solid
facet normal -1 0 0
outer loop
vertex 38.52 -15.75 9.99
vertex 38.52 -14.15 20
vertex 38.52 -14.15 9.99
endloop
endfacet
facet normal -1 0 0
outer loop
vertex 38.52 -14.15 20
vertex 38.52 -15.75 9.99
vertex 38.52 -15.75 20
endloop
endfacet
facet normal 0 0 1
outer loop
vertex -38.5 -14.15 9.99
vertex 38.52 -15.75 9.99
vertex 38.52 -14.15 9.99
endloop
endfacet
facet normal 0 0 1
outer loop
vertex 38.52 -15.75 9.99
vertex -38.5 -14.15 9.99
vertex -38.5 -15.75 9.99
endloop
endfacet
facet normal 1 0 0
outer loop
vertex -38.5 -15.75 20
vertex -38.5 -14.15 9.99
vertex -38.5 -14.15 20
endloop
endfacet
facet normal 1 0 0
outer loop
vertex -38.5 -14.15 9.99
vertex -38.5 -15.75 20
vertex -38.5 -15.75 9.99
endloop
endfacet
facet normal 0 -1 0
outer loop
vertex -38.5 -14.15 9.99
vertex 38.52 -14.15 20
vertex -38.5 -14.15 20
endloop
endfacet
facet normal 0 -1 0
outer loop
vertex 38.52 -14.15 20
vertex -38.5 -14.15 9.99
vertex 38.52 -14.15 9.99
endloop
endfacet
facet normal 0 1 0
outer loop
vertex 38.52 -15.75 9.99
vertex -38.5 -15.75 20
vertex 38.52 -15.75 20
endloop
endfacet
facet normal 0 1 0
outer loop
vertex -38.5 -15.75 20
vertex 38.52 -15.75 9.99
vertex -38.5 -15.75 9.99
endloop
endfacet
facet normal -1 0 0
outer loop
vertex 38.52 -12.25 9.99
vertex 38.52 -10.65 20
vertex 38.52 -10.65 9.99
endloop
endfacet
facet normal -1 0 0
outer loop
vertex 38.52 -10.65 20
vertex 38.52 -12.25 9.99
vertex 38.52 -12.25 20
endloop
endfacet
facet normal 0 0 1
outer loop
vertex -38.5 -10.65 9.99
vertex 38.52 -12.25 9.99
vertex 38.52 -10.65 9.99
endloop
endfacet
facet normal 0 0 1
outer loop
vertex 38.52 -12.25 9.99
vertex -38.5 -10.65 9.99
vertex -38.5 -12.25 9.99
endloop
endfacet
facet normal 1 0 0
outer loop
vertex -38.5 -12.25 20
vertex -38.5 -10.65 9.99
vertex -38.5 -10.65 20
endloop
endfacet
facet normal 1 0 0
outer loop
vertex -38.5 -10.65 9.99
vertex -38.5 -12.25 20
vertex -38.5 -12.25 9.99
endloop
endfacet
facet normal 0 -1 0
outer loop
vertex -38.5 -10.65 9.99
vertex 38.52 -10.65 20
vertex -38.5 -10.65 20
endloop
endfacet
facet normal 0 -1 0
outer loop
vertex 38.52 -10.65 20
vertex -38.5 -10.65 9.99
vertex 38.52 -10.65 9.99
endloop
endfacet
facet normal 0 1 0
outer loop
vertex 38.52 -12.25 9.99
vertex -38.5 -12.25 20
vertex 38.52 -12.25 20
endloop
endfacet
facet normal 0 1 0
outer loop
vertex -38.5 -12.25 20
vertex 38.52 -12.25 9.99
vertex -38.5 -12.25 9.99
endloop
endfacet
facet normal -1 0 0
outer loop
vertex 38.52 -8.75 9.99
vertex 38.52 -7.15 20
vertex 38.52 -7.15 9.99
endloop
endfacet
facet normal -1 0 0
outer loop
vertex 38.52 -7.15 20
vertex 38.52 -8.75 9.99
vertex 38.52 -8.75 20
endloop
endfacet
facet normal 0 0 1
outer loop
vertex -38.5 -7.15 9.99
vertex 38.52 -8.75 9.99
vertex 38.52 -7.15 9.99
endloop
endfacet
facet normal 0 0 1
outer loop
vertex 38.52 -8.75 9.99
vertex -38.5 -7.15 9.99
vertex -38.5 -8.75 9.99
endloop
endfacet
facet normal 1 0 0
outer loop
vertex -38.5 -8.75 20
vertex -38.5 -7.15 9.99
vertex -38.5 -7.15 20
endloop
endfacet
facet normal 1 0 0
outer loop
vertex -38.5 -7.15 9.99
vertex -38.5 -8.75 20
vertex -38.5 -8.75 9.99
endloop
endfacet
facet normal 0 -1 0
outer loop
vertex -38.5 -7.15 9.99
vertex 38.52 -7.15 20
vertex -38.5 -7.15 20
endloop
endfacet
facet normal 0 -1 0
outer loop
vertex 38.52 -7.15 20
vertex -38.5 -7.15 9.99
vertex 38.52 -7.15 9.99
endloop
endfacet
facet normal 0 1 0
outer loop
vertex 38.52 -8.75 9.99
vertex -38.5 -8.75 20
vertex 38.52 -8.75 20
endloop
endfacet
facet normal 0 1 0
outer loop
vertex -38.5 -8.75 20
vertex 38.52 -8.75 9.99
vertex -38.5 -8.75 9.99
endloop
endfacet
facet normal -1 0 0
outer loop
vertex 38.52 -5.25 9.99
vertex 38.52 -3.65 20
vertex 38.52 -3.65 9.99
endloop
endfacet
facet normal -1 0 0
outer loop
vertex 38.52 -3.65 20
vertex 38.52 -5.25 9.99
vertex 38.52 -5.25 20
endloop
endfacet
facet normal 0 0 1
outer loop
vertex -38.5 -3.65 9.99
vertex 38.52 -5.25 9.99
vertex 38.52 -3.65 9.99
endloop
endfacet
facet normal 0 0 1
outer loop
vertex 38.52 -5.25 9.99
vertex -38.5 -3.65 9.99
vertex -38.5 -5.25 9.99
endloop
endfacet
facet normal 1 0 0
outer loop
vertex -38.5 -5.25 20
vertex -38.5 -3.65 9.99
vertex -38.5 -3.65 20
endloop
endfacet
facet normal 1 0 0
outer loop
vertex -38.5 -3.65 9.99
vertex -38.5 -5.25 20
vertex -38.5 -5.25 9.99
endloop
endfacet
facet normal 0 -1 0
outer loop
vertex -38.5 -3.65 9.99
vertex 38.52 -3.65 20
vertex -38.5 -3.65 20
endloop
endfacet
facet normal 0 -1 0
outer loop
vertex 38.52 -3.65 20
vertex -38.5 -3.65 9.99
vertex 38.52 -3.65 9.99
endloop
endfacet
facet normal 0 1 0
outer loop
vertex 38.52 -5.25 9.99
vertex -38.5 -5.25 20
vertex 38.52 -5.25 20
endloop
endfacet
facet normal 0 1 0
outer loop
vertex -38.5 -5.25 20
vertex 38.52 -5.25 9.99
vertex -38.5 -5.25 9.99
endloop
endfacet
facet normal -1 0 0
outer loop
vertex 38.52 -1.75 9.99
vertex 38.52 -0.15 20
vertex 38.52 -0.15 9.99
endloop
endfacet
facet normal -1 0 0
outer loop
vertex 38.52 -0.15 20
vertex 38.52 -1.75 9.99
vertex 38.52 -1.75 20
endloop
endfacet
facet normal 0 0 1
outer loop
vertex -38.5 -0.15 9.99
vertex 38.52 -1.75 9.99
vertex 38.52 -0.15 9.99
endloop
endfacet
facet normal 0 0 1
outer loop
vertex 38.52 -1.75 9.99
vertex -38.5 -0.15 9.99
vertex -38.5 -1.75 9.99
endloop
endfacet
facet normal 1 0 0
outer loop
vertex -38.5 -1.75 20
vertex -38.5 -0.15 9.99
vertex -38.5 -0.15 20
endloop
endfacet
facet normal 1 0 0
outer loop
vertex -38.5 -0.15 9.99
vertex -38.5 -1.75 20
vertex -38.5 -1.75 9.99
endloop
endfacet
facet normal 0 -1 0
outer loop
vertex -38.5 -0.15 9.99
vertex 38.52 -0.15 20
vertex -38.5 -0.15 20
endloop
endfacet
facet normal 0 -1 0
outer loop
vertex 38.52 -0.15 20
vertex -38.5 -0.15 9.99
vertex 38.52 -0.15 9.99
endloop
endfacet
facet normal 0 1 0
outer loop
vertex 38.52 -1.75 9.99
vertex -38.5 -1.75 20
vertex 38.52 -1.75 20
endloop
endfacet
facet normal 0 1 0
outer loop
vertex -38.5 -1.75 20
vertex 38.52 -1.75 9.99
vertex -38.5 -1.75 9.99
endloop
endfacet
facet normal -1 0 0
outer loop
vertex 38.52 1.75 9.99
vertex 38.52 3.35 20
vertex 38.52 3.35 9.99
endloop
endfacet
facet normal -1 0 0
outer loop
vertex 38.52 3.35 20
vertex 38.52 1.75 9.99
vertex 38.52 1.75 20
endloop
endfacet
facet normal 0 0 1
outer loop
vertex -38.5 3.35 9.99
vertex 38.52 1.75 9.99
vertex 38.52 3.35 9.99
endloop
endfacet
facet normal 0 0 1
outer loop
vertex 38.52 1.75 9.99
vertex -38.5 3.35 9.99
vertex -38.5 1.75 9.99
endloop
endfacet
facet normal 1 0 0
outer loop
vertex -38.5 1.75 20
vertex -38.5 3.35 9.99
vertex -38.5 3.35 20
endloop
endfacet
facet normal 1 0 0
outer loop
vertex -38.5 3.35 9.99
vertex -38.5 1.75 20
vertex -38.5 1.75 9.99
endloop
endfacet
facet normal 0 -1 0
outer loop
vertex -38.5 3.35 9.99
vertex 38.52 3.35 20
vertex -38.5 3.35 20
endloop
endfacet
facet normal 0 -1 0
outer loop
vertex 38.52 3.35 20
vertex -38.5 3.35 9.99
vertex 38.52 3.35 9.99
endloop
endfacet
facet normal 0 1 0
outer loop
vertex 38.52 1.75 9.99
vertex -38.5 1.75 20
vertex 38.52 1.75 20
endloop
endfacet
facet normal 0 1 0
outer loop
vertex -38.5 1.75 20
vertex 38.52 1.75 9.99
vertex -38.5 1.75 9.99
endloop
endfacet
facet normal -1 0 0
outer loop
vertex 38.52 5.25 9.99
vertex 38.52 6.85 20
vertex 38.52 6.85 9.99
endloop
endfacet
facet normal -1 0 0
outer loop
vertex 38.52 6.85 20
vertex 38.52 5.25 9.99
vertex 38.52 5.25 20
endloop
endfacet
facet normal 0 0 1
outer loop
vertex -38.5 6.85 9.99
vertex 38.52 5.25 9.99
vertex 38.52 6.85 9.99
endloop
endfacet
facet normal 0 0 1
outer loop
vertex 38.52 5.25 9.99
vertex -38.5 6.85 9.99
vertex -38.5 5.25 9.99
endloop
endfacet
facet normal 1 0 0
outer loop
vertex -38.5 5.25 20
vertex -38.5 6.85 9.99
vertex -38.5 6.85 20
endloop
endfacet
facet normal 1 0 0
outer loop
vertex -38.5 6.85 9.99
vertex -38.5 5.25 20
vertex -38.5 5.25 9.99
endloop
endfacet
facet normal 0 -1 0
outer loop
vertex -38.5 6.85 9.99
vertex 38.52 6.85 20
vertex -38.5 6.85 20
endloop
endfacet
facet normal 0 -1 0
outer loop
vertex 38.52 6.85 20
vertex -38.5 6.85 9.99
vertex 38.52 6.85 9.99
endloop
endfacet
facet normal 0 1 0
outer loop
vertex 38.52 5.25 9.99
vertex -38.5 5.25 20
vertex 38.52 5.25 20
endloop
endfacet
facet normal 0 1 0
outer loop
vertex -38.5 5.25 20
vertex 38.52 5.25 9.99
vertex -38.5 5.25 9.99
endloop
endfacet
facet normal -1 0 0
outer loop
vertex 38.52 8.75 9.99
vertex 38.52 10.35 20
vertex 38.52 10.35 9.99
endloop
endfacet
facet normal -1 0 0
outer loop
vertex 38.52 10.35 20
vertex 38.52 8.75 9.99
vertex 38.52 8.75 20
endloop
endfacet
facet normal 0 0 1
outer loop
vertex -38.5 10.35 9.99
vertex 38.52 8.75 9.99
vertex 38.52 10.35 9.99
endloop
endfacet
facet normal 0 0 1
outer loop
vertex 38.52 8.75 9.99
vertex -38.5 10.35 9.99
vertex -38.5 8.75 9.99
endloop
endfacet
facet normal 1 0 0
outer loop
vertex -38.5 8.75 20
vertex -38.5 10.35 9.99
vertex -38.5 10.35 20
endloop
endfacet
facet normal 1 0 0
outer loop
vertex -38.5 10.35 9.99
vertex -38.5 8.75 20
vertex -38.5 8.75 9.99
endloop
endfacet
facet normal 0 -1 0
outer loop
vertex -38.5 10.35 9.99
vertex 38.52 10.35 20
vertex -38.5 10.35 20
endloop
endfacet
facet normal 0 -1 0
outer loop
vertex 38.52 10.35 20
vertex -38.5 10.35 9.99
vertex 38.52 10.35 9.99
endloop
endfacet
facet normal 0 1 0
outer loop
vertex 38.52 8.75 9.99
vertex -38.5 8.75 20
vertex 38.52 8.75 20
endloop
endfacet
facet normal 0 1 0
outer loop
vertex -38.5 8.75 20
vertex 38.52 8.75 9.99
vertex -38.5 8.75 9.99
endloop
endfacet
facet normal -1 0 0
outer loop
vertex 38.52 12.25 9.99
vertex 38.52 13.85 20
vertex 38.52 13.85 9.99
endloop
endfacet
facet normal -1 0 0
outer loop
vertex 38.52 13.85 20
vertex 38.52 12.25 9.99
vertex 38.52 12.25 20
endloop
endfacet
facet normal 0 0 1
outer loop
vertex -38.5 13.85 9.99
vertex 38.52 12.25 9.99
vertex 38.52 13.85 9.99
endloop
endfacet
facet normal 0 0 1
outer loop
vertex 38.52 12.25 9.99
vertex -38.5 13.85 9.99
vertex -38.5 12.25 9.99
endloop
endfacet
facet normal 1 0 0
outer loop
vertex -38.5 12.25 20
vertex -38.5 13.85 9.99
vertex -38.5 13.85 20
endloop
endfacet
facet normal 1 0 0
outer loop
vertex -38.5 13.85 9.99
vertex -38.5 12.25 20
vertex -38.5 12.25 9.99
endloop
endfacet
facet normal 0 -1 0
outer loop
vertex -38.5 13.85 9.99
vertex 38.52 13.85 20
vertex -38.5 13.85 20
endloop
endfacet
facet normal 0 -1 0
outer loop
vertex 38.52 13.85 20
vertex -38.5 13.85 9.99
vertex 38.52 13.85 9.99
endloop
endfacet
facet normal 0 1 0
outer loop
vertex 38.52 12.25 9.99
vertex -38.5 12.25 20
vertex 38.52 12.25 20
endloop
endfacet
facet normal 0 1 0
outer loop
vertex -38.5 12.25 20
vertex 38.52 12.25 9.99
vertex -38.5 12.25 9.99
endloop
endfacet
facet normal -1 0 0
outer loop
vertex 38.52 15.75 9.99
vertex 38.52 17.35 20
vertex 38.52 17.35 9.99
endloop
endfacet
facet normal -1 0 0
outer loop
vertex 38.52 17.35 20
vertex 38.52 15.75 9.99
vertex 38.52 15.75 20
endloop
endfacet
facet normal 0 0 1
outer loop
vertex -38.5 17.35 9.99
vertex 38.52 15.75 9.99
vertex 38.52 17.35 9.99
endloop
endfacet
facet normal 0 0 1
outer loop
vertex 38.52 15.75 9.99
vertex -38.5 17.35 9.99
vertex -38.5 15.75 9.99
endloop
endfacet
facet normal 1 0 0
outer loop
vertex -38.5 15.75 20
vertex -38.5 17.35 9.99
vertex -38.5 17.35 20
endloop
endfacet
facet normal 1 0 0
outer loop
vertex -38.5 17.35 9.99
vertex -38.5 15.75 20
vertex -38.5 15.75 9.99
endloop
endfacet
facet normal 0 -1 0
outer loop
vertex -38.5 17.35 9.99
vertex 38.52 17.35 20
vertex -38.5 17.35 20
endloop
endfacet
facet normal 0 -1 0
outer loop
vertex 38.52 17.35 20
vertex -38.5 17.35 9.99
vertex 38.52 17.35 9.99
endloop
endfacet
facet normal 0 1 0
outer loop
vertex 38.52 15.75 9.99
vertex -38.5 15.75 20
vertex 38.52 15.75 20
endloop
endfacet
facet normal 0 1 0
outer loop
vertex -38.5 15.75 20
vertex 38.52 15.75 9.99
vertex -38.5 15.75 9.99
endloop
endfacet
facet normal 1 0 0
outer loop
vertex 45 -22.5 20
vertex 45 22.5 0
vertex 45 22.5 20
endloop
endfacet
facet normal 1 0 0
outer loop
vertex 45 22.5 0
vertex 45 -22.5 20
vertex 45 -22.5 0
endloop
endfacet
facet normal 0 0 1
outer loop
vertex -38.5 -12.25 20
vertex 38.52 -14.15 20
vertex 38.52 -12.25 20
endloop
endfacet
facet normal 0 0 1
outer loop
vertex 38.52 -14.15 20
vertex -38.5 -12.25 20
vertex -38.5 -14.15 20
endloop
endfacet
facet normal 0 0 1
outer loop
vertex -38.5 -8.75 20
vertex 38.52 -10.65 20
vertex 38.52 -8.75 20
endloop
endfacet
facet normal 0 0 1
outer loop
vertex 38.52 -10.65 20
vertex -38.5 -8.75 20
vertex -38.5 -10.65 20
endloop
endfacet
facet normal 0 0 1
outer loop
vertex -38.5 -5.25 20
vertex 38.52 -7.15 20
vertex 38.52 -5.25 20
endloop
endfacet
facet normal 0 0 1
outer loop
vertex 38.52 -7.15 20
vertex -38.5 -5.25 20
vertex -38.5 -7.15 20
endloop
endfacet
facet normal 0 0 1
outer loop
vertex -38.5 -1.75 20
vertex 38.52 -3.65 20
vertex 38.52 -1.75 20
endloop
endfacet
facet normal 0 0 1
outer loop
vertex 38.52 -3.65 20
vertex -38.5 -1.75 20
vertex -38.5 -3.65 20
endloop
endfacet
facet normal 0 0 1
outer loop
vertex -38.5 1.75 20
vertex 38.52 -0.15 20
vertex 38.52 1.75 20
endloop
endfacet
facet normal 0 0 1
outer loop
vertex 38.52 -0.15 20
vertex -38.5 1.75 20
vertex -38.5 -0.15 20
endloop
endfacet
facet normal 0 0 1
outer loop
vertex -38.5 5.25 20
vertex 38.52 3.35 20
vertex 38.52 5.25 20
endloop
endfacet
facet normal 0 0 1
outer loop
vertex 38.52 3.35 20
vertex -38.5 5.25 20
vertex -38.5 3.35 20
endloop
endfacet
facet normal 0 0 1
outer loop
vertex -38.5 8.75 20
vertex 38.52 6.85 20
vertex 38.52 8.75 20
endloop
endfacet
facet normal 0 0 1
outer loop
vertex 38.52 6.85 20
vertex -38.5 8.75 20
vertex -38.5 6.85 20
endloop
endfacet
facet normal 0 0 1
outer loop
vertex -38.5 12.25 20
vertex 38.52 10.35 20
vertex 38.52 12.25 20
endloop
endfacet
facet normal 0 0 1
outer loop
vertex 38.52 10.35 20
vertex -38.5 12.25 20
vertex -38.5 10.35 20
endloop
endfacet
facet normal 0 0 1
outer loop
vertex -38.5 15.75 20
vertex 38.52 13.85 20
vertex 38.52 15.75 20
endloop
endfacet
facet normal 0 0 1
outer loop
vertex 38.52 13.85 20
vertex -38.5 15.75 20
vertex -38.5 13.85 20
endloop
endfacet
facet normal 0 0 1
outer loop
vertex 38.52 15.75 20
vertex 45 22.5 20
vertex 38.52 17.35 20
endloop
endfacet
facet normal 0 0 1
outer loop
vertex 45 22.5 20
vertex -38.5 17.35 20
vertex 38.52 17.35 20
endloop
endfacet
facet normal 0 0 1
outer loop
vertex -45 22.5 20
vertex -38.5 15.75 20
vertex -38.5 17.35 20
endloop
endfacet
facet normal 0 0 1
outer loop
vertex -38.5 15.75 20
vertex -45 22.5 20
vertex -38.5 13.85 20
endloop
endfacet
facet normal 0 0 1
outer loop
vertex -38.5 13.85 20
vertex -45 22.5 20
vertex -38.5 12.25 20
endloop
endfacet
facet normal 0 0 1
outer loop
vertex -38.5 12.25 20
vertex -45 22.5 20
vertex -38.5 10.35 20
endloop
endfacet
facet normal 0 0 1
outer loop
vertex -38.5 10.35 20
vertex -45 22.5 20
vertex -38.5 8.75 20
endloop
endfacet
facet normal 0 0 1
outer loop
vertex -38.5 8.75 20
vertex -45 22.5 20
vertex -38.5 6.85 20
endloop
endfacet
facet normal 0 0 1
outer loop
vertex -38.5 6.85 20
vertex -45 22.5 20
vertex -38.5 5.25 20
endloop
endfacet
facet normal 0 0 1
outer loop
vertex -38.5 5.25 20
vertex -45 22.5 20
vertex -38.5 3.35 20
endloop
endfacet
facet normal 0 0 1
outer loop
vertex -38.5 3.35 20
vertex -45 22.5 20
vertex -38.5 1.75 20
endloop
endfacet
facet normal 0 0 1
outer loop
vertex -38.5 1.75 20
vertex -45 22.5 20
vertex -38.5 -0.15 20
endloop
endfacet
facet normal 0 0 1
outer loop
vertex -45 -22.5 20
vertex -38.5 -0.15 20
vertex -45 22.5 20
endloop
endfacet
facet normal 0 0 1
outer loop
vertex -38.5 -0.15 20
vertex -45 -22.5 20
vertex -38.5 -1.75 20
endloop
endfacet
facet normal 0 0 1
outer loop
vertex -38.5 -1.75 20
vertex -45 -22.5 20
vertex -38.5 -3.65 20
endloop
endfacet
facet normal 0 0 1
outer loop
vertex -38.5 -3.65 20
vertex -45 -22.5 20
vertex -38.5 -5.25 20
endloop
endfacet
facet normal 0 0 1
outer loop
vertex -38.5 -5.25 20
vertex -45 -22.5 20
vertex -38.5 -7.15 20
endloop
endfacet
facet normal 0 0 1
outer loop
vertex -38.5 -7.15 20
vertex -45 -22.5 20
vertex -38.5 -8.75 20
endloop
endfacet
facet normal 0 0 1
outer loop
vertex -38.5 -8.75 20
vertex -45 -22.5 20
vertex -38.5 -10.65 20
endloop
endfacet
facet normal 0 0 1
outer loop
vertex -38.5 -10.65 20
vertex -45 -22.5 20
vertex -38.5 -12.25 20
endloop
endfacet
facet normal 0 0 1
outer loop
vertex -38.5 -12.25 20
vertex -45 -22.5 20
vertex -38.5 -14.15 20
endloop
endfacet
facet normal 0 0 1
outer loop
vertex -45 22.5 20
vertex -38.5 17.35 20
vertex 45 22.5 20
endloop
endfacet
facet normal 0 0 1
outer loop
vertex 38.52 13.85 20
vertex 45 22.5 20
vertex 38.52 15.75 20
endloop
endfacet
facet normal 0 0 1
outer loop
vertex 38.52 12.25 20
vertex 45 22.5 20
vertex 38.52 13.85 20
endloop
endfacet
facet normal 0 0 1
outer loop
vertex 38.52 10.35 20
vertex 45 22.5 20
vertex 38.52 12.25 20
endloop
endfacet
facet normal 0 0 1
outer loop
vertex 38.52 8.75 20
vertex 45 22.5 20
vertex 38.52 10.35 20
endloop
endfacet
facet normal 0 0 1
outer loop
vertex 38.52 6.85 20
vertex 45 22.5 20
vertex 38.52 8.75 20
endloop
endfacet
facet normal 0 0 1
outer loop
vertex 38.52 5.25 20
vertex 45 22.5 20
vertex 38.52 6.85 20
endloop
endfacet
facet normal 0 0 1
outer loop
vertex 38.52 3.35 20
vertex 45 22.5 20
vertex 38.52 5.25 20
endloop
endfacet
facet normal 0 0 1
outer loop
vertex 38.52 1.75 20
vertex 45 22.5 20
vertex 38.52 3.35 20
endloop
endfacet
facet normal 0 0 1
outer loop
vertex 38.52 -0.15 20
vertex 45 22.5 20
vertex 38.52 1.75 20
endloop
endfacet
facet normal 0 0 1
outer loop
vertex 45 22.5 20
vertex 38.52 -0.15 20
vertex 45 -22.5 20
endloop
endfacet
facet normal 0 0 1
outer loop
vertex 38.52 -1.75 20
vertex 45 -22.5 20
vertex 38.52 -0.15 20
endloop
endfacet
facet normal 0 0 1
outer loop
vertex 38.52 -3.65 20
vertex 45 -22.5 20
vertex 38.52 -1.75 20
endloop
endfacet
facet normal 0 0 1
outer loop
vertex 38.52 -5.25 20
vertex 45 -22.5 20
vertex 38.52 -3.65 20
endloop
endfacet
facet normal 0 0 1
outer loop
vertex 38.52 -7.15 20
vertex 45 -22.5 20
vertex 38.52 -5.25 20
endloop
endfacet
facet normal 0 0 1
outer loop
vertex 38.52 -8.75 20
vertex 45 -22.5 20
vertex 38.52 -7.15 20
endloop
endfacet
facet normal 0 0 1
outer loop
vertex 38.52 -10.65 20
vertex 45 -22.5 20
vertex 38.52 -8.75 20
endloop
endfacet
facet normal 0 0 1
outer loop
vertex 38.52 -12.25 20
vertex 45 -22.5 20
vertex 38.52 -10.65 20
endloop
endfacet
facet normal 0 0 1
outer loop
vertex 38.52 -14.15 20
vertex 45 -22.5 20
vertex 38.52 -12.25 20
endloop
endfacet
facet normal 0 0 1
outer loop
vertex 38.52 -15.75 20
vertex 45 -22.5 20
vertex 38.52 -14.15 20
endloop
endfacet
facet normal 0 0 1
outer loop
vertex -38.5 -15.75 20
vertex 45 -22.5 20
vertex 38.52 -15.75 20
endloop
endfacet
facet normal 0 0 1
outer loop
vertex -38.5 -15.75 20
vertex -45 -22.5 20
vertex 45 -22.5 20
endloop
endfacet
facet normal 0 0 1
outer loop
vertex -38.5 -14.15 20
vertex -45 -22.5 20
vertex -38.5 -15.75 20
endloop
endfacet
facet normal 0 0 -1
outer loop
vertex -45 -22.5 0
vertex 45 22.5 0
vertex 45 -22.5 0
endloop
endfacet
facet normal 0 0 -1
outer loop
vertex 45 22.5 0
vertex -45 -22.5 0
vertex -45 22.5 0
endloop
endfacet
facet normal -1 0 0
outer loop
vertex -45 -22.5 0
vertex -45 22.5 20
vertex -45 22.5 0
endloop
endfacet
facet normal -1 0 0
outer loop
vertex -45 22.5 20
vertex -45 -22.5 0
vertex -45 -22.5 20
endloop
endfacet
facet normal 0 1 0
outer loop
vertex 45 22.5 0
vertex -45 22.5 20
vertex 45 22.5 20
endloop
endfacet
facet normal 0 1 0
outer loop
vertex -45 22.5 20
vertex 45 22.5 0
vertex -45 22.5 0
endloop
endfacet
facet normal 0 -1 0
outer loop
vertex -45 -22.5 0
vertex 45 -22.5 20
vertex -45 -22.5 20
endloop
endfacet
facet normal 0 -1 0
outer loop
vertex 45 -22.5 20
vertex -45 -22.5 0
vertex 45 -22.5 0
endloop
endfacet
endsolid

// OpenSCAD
// Drying Rack for 10 Microscope Slides
// Dimensions measured with calipers

// Base block dimensions
base_length = 90;   // mm (X)
base_width = 45;    // mm (Y)
base_height = 20;   // mm (Z)

// Slot dimensions
slot_length = 77;   // mm (X)
slot_width = 1.6;   // mm (Y)
slot_depth = 10;    // mm (Z)

// Slot arrangement
num_slots = 10;
slot_spacing = 3.5; // mm centre-to-centre (Y)

// Rendering quality
$fn = 64;

// Calculate total width of the slot group
total_slot_group_width = (num_slots - 1) * slot_spacing;

// Calculate starting Y position to centre the group on the block
// The centre of the group is at Y=0.
// The first slot centre is at -total_slot_group_width/2
start_y = -total_slot_group_width / 2;

// Build the base block
difference() {
    // Main solid block
    translate([-base_length/2, -base_width/2, 0])
        cube([base_length, base_width, base_height]);

    // Cut out the slots
    for (i = [0 : num_slots - 1]) {
        y_pos = start_y + i * slot_spacing;
        
        // Slot cutter: extends slightly past the base in X and Z to ensure clean cut
        translate([-slot_length/2, y_pos, base_height - slot_depth - 0.01])
            cube([slot_length + 0.02, slot_width, slot_depth + 0.02]);
    }
}
